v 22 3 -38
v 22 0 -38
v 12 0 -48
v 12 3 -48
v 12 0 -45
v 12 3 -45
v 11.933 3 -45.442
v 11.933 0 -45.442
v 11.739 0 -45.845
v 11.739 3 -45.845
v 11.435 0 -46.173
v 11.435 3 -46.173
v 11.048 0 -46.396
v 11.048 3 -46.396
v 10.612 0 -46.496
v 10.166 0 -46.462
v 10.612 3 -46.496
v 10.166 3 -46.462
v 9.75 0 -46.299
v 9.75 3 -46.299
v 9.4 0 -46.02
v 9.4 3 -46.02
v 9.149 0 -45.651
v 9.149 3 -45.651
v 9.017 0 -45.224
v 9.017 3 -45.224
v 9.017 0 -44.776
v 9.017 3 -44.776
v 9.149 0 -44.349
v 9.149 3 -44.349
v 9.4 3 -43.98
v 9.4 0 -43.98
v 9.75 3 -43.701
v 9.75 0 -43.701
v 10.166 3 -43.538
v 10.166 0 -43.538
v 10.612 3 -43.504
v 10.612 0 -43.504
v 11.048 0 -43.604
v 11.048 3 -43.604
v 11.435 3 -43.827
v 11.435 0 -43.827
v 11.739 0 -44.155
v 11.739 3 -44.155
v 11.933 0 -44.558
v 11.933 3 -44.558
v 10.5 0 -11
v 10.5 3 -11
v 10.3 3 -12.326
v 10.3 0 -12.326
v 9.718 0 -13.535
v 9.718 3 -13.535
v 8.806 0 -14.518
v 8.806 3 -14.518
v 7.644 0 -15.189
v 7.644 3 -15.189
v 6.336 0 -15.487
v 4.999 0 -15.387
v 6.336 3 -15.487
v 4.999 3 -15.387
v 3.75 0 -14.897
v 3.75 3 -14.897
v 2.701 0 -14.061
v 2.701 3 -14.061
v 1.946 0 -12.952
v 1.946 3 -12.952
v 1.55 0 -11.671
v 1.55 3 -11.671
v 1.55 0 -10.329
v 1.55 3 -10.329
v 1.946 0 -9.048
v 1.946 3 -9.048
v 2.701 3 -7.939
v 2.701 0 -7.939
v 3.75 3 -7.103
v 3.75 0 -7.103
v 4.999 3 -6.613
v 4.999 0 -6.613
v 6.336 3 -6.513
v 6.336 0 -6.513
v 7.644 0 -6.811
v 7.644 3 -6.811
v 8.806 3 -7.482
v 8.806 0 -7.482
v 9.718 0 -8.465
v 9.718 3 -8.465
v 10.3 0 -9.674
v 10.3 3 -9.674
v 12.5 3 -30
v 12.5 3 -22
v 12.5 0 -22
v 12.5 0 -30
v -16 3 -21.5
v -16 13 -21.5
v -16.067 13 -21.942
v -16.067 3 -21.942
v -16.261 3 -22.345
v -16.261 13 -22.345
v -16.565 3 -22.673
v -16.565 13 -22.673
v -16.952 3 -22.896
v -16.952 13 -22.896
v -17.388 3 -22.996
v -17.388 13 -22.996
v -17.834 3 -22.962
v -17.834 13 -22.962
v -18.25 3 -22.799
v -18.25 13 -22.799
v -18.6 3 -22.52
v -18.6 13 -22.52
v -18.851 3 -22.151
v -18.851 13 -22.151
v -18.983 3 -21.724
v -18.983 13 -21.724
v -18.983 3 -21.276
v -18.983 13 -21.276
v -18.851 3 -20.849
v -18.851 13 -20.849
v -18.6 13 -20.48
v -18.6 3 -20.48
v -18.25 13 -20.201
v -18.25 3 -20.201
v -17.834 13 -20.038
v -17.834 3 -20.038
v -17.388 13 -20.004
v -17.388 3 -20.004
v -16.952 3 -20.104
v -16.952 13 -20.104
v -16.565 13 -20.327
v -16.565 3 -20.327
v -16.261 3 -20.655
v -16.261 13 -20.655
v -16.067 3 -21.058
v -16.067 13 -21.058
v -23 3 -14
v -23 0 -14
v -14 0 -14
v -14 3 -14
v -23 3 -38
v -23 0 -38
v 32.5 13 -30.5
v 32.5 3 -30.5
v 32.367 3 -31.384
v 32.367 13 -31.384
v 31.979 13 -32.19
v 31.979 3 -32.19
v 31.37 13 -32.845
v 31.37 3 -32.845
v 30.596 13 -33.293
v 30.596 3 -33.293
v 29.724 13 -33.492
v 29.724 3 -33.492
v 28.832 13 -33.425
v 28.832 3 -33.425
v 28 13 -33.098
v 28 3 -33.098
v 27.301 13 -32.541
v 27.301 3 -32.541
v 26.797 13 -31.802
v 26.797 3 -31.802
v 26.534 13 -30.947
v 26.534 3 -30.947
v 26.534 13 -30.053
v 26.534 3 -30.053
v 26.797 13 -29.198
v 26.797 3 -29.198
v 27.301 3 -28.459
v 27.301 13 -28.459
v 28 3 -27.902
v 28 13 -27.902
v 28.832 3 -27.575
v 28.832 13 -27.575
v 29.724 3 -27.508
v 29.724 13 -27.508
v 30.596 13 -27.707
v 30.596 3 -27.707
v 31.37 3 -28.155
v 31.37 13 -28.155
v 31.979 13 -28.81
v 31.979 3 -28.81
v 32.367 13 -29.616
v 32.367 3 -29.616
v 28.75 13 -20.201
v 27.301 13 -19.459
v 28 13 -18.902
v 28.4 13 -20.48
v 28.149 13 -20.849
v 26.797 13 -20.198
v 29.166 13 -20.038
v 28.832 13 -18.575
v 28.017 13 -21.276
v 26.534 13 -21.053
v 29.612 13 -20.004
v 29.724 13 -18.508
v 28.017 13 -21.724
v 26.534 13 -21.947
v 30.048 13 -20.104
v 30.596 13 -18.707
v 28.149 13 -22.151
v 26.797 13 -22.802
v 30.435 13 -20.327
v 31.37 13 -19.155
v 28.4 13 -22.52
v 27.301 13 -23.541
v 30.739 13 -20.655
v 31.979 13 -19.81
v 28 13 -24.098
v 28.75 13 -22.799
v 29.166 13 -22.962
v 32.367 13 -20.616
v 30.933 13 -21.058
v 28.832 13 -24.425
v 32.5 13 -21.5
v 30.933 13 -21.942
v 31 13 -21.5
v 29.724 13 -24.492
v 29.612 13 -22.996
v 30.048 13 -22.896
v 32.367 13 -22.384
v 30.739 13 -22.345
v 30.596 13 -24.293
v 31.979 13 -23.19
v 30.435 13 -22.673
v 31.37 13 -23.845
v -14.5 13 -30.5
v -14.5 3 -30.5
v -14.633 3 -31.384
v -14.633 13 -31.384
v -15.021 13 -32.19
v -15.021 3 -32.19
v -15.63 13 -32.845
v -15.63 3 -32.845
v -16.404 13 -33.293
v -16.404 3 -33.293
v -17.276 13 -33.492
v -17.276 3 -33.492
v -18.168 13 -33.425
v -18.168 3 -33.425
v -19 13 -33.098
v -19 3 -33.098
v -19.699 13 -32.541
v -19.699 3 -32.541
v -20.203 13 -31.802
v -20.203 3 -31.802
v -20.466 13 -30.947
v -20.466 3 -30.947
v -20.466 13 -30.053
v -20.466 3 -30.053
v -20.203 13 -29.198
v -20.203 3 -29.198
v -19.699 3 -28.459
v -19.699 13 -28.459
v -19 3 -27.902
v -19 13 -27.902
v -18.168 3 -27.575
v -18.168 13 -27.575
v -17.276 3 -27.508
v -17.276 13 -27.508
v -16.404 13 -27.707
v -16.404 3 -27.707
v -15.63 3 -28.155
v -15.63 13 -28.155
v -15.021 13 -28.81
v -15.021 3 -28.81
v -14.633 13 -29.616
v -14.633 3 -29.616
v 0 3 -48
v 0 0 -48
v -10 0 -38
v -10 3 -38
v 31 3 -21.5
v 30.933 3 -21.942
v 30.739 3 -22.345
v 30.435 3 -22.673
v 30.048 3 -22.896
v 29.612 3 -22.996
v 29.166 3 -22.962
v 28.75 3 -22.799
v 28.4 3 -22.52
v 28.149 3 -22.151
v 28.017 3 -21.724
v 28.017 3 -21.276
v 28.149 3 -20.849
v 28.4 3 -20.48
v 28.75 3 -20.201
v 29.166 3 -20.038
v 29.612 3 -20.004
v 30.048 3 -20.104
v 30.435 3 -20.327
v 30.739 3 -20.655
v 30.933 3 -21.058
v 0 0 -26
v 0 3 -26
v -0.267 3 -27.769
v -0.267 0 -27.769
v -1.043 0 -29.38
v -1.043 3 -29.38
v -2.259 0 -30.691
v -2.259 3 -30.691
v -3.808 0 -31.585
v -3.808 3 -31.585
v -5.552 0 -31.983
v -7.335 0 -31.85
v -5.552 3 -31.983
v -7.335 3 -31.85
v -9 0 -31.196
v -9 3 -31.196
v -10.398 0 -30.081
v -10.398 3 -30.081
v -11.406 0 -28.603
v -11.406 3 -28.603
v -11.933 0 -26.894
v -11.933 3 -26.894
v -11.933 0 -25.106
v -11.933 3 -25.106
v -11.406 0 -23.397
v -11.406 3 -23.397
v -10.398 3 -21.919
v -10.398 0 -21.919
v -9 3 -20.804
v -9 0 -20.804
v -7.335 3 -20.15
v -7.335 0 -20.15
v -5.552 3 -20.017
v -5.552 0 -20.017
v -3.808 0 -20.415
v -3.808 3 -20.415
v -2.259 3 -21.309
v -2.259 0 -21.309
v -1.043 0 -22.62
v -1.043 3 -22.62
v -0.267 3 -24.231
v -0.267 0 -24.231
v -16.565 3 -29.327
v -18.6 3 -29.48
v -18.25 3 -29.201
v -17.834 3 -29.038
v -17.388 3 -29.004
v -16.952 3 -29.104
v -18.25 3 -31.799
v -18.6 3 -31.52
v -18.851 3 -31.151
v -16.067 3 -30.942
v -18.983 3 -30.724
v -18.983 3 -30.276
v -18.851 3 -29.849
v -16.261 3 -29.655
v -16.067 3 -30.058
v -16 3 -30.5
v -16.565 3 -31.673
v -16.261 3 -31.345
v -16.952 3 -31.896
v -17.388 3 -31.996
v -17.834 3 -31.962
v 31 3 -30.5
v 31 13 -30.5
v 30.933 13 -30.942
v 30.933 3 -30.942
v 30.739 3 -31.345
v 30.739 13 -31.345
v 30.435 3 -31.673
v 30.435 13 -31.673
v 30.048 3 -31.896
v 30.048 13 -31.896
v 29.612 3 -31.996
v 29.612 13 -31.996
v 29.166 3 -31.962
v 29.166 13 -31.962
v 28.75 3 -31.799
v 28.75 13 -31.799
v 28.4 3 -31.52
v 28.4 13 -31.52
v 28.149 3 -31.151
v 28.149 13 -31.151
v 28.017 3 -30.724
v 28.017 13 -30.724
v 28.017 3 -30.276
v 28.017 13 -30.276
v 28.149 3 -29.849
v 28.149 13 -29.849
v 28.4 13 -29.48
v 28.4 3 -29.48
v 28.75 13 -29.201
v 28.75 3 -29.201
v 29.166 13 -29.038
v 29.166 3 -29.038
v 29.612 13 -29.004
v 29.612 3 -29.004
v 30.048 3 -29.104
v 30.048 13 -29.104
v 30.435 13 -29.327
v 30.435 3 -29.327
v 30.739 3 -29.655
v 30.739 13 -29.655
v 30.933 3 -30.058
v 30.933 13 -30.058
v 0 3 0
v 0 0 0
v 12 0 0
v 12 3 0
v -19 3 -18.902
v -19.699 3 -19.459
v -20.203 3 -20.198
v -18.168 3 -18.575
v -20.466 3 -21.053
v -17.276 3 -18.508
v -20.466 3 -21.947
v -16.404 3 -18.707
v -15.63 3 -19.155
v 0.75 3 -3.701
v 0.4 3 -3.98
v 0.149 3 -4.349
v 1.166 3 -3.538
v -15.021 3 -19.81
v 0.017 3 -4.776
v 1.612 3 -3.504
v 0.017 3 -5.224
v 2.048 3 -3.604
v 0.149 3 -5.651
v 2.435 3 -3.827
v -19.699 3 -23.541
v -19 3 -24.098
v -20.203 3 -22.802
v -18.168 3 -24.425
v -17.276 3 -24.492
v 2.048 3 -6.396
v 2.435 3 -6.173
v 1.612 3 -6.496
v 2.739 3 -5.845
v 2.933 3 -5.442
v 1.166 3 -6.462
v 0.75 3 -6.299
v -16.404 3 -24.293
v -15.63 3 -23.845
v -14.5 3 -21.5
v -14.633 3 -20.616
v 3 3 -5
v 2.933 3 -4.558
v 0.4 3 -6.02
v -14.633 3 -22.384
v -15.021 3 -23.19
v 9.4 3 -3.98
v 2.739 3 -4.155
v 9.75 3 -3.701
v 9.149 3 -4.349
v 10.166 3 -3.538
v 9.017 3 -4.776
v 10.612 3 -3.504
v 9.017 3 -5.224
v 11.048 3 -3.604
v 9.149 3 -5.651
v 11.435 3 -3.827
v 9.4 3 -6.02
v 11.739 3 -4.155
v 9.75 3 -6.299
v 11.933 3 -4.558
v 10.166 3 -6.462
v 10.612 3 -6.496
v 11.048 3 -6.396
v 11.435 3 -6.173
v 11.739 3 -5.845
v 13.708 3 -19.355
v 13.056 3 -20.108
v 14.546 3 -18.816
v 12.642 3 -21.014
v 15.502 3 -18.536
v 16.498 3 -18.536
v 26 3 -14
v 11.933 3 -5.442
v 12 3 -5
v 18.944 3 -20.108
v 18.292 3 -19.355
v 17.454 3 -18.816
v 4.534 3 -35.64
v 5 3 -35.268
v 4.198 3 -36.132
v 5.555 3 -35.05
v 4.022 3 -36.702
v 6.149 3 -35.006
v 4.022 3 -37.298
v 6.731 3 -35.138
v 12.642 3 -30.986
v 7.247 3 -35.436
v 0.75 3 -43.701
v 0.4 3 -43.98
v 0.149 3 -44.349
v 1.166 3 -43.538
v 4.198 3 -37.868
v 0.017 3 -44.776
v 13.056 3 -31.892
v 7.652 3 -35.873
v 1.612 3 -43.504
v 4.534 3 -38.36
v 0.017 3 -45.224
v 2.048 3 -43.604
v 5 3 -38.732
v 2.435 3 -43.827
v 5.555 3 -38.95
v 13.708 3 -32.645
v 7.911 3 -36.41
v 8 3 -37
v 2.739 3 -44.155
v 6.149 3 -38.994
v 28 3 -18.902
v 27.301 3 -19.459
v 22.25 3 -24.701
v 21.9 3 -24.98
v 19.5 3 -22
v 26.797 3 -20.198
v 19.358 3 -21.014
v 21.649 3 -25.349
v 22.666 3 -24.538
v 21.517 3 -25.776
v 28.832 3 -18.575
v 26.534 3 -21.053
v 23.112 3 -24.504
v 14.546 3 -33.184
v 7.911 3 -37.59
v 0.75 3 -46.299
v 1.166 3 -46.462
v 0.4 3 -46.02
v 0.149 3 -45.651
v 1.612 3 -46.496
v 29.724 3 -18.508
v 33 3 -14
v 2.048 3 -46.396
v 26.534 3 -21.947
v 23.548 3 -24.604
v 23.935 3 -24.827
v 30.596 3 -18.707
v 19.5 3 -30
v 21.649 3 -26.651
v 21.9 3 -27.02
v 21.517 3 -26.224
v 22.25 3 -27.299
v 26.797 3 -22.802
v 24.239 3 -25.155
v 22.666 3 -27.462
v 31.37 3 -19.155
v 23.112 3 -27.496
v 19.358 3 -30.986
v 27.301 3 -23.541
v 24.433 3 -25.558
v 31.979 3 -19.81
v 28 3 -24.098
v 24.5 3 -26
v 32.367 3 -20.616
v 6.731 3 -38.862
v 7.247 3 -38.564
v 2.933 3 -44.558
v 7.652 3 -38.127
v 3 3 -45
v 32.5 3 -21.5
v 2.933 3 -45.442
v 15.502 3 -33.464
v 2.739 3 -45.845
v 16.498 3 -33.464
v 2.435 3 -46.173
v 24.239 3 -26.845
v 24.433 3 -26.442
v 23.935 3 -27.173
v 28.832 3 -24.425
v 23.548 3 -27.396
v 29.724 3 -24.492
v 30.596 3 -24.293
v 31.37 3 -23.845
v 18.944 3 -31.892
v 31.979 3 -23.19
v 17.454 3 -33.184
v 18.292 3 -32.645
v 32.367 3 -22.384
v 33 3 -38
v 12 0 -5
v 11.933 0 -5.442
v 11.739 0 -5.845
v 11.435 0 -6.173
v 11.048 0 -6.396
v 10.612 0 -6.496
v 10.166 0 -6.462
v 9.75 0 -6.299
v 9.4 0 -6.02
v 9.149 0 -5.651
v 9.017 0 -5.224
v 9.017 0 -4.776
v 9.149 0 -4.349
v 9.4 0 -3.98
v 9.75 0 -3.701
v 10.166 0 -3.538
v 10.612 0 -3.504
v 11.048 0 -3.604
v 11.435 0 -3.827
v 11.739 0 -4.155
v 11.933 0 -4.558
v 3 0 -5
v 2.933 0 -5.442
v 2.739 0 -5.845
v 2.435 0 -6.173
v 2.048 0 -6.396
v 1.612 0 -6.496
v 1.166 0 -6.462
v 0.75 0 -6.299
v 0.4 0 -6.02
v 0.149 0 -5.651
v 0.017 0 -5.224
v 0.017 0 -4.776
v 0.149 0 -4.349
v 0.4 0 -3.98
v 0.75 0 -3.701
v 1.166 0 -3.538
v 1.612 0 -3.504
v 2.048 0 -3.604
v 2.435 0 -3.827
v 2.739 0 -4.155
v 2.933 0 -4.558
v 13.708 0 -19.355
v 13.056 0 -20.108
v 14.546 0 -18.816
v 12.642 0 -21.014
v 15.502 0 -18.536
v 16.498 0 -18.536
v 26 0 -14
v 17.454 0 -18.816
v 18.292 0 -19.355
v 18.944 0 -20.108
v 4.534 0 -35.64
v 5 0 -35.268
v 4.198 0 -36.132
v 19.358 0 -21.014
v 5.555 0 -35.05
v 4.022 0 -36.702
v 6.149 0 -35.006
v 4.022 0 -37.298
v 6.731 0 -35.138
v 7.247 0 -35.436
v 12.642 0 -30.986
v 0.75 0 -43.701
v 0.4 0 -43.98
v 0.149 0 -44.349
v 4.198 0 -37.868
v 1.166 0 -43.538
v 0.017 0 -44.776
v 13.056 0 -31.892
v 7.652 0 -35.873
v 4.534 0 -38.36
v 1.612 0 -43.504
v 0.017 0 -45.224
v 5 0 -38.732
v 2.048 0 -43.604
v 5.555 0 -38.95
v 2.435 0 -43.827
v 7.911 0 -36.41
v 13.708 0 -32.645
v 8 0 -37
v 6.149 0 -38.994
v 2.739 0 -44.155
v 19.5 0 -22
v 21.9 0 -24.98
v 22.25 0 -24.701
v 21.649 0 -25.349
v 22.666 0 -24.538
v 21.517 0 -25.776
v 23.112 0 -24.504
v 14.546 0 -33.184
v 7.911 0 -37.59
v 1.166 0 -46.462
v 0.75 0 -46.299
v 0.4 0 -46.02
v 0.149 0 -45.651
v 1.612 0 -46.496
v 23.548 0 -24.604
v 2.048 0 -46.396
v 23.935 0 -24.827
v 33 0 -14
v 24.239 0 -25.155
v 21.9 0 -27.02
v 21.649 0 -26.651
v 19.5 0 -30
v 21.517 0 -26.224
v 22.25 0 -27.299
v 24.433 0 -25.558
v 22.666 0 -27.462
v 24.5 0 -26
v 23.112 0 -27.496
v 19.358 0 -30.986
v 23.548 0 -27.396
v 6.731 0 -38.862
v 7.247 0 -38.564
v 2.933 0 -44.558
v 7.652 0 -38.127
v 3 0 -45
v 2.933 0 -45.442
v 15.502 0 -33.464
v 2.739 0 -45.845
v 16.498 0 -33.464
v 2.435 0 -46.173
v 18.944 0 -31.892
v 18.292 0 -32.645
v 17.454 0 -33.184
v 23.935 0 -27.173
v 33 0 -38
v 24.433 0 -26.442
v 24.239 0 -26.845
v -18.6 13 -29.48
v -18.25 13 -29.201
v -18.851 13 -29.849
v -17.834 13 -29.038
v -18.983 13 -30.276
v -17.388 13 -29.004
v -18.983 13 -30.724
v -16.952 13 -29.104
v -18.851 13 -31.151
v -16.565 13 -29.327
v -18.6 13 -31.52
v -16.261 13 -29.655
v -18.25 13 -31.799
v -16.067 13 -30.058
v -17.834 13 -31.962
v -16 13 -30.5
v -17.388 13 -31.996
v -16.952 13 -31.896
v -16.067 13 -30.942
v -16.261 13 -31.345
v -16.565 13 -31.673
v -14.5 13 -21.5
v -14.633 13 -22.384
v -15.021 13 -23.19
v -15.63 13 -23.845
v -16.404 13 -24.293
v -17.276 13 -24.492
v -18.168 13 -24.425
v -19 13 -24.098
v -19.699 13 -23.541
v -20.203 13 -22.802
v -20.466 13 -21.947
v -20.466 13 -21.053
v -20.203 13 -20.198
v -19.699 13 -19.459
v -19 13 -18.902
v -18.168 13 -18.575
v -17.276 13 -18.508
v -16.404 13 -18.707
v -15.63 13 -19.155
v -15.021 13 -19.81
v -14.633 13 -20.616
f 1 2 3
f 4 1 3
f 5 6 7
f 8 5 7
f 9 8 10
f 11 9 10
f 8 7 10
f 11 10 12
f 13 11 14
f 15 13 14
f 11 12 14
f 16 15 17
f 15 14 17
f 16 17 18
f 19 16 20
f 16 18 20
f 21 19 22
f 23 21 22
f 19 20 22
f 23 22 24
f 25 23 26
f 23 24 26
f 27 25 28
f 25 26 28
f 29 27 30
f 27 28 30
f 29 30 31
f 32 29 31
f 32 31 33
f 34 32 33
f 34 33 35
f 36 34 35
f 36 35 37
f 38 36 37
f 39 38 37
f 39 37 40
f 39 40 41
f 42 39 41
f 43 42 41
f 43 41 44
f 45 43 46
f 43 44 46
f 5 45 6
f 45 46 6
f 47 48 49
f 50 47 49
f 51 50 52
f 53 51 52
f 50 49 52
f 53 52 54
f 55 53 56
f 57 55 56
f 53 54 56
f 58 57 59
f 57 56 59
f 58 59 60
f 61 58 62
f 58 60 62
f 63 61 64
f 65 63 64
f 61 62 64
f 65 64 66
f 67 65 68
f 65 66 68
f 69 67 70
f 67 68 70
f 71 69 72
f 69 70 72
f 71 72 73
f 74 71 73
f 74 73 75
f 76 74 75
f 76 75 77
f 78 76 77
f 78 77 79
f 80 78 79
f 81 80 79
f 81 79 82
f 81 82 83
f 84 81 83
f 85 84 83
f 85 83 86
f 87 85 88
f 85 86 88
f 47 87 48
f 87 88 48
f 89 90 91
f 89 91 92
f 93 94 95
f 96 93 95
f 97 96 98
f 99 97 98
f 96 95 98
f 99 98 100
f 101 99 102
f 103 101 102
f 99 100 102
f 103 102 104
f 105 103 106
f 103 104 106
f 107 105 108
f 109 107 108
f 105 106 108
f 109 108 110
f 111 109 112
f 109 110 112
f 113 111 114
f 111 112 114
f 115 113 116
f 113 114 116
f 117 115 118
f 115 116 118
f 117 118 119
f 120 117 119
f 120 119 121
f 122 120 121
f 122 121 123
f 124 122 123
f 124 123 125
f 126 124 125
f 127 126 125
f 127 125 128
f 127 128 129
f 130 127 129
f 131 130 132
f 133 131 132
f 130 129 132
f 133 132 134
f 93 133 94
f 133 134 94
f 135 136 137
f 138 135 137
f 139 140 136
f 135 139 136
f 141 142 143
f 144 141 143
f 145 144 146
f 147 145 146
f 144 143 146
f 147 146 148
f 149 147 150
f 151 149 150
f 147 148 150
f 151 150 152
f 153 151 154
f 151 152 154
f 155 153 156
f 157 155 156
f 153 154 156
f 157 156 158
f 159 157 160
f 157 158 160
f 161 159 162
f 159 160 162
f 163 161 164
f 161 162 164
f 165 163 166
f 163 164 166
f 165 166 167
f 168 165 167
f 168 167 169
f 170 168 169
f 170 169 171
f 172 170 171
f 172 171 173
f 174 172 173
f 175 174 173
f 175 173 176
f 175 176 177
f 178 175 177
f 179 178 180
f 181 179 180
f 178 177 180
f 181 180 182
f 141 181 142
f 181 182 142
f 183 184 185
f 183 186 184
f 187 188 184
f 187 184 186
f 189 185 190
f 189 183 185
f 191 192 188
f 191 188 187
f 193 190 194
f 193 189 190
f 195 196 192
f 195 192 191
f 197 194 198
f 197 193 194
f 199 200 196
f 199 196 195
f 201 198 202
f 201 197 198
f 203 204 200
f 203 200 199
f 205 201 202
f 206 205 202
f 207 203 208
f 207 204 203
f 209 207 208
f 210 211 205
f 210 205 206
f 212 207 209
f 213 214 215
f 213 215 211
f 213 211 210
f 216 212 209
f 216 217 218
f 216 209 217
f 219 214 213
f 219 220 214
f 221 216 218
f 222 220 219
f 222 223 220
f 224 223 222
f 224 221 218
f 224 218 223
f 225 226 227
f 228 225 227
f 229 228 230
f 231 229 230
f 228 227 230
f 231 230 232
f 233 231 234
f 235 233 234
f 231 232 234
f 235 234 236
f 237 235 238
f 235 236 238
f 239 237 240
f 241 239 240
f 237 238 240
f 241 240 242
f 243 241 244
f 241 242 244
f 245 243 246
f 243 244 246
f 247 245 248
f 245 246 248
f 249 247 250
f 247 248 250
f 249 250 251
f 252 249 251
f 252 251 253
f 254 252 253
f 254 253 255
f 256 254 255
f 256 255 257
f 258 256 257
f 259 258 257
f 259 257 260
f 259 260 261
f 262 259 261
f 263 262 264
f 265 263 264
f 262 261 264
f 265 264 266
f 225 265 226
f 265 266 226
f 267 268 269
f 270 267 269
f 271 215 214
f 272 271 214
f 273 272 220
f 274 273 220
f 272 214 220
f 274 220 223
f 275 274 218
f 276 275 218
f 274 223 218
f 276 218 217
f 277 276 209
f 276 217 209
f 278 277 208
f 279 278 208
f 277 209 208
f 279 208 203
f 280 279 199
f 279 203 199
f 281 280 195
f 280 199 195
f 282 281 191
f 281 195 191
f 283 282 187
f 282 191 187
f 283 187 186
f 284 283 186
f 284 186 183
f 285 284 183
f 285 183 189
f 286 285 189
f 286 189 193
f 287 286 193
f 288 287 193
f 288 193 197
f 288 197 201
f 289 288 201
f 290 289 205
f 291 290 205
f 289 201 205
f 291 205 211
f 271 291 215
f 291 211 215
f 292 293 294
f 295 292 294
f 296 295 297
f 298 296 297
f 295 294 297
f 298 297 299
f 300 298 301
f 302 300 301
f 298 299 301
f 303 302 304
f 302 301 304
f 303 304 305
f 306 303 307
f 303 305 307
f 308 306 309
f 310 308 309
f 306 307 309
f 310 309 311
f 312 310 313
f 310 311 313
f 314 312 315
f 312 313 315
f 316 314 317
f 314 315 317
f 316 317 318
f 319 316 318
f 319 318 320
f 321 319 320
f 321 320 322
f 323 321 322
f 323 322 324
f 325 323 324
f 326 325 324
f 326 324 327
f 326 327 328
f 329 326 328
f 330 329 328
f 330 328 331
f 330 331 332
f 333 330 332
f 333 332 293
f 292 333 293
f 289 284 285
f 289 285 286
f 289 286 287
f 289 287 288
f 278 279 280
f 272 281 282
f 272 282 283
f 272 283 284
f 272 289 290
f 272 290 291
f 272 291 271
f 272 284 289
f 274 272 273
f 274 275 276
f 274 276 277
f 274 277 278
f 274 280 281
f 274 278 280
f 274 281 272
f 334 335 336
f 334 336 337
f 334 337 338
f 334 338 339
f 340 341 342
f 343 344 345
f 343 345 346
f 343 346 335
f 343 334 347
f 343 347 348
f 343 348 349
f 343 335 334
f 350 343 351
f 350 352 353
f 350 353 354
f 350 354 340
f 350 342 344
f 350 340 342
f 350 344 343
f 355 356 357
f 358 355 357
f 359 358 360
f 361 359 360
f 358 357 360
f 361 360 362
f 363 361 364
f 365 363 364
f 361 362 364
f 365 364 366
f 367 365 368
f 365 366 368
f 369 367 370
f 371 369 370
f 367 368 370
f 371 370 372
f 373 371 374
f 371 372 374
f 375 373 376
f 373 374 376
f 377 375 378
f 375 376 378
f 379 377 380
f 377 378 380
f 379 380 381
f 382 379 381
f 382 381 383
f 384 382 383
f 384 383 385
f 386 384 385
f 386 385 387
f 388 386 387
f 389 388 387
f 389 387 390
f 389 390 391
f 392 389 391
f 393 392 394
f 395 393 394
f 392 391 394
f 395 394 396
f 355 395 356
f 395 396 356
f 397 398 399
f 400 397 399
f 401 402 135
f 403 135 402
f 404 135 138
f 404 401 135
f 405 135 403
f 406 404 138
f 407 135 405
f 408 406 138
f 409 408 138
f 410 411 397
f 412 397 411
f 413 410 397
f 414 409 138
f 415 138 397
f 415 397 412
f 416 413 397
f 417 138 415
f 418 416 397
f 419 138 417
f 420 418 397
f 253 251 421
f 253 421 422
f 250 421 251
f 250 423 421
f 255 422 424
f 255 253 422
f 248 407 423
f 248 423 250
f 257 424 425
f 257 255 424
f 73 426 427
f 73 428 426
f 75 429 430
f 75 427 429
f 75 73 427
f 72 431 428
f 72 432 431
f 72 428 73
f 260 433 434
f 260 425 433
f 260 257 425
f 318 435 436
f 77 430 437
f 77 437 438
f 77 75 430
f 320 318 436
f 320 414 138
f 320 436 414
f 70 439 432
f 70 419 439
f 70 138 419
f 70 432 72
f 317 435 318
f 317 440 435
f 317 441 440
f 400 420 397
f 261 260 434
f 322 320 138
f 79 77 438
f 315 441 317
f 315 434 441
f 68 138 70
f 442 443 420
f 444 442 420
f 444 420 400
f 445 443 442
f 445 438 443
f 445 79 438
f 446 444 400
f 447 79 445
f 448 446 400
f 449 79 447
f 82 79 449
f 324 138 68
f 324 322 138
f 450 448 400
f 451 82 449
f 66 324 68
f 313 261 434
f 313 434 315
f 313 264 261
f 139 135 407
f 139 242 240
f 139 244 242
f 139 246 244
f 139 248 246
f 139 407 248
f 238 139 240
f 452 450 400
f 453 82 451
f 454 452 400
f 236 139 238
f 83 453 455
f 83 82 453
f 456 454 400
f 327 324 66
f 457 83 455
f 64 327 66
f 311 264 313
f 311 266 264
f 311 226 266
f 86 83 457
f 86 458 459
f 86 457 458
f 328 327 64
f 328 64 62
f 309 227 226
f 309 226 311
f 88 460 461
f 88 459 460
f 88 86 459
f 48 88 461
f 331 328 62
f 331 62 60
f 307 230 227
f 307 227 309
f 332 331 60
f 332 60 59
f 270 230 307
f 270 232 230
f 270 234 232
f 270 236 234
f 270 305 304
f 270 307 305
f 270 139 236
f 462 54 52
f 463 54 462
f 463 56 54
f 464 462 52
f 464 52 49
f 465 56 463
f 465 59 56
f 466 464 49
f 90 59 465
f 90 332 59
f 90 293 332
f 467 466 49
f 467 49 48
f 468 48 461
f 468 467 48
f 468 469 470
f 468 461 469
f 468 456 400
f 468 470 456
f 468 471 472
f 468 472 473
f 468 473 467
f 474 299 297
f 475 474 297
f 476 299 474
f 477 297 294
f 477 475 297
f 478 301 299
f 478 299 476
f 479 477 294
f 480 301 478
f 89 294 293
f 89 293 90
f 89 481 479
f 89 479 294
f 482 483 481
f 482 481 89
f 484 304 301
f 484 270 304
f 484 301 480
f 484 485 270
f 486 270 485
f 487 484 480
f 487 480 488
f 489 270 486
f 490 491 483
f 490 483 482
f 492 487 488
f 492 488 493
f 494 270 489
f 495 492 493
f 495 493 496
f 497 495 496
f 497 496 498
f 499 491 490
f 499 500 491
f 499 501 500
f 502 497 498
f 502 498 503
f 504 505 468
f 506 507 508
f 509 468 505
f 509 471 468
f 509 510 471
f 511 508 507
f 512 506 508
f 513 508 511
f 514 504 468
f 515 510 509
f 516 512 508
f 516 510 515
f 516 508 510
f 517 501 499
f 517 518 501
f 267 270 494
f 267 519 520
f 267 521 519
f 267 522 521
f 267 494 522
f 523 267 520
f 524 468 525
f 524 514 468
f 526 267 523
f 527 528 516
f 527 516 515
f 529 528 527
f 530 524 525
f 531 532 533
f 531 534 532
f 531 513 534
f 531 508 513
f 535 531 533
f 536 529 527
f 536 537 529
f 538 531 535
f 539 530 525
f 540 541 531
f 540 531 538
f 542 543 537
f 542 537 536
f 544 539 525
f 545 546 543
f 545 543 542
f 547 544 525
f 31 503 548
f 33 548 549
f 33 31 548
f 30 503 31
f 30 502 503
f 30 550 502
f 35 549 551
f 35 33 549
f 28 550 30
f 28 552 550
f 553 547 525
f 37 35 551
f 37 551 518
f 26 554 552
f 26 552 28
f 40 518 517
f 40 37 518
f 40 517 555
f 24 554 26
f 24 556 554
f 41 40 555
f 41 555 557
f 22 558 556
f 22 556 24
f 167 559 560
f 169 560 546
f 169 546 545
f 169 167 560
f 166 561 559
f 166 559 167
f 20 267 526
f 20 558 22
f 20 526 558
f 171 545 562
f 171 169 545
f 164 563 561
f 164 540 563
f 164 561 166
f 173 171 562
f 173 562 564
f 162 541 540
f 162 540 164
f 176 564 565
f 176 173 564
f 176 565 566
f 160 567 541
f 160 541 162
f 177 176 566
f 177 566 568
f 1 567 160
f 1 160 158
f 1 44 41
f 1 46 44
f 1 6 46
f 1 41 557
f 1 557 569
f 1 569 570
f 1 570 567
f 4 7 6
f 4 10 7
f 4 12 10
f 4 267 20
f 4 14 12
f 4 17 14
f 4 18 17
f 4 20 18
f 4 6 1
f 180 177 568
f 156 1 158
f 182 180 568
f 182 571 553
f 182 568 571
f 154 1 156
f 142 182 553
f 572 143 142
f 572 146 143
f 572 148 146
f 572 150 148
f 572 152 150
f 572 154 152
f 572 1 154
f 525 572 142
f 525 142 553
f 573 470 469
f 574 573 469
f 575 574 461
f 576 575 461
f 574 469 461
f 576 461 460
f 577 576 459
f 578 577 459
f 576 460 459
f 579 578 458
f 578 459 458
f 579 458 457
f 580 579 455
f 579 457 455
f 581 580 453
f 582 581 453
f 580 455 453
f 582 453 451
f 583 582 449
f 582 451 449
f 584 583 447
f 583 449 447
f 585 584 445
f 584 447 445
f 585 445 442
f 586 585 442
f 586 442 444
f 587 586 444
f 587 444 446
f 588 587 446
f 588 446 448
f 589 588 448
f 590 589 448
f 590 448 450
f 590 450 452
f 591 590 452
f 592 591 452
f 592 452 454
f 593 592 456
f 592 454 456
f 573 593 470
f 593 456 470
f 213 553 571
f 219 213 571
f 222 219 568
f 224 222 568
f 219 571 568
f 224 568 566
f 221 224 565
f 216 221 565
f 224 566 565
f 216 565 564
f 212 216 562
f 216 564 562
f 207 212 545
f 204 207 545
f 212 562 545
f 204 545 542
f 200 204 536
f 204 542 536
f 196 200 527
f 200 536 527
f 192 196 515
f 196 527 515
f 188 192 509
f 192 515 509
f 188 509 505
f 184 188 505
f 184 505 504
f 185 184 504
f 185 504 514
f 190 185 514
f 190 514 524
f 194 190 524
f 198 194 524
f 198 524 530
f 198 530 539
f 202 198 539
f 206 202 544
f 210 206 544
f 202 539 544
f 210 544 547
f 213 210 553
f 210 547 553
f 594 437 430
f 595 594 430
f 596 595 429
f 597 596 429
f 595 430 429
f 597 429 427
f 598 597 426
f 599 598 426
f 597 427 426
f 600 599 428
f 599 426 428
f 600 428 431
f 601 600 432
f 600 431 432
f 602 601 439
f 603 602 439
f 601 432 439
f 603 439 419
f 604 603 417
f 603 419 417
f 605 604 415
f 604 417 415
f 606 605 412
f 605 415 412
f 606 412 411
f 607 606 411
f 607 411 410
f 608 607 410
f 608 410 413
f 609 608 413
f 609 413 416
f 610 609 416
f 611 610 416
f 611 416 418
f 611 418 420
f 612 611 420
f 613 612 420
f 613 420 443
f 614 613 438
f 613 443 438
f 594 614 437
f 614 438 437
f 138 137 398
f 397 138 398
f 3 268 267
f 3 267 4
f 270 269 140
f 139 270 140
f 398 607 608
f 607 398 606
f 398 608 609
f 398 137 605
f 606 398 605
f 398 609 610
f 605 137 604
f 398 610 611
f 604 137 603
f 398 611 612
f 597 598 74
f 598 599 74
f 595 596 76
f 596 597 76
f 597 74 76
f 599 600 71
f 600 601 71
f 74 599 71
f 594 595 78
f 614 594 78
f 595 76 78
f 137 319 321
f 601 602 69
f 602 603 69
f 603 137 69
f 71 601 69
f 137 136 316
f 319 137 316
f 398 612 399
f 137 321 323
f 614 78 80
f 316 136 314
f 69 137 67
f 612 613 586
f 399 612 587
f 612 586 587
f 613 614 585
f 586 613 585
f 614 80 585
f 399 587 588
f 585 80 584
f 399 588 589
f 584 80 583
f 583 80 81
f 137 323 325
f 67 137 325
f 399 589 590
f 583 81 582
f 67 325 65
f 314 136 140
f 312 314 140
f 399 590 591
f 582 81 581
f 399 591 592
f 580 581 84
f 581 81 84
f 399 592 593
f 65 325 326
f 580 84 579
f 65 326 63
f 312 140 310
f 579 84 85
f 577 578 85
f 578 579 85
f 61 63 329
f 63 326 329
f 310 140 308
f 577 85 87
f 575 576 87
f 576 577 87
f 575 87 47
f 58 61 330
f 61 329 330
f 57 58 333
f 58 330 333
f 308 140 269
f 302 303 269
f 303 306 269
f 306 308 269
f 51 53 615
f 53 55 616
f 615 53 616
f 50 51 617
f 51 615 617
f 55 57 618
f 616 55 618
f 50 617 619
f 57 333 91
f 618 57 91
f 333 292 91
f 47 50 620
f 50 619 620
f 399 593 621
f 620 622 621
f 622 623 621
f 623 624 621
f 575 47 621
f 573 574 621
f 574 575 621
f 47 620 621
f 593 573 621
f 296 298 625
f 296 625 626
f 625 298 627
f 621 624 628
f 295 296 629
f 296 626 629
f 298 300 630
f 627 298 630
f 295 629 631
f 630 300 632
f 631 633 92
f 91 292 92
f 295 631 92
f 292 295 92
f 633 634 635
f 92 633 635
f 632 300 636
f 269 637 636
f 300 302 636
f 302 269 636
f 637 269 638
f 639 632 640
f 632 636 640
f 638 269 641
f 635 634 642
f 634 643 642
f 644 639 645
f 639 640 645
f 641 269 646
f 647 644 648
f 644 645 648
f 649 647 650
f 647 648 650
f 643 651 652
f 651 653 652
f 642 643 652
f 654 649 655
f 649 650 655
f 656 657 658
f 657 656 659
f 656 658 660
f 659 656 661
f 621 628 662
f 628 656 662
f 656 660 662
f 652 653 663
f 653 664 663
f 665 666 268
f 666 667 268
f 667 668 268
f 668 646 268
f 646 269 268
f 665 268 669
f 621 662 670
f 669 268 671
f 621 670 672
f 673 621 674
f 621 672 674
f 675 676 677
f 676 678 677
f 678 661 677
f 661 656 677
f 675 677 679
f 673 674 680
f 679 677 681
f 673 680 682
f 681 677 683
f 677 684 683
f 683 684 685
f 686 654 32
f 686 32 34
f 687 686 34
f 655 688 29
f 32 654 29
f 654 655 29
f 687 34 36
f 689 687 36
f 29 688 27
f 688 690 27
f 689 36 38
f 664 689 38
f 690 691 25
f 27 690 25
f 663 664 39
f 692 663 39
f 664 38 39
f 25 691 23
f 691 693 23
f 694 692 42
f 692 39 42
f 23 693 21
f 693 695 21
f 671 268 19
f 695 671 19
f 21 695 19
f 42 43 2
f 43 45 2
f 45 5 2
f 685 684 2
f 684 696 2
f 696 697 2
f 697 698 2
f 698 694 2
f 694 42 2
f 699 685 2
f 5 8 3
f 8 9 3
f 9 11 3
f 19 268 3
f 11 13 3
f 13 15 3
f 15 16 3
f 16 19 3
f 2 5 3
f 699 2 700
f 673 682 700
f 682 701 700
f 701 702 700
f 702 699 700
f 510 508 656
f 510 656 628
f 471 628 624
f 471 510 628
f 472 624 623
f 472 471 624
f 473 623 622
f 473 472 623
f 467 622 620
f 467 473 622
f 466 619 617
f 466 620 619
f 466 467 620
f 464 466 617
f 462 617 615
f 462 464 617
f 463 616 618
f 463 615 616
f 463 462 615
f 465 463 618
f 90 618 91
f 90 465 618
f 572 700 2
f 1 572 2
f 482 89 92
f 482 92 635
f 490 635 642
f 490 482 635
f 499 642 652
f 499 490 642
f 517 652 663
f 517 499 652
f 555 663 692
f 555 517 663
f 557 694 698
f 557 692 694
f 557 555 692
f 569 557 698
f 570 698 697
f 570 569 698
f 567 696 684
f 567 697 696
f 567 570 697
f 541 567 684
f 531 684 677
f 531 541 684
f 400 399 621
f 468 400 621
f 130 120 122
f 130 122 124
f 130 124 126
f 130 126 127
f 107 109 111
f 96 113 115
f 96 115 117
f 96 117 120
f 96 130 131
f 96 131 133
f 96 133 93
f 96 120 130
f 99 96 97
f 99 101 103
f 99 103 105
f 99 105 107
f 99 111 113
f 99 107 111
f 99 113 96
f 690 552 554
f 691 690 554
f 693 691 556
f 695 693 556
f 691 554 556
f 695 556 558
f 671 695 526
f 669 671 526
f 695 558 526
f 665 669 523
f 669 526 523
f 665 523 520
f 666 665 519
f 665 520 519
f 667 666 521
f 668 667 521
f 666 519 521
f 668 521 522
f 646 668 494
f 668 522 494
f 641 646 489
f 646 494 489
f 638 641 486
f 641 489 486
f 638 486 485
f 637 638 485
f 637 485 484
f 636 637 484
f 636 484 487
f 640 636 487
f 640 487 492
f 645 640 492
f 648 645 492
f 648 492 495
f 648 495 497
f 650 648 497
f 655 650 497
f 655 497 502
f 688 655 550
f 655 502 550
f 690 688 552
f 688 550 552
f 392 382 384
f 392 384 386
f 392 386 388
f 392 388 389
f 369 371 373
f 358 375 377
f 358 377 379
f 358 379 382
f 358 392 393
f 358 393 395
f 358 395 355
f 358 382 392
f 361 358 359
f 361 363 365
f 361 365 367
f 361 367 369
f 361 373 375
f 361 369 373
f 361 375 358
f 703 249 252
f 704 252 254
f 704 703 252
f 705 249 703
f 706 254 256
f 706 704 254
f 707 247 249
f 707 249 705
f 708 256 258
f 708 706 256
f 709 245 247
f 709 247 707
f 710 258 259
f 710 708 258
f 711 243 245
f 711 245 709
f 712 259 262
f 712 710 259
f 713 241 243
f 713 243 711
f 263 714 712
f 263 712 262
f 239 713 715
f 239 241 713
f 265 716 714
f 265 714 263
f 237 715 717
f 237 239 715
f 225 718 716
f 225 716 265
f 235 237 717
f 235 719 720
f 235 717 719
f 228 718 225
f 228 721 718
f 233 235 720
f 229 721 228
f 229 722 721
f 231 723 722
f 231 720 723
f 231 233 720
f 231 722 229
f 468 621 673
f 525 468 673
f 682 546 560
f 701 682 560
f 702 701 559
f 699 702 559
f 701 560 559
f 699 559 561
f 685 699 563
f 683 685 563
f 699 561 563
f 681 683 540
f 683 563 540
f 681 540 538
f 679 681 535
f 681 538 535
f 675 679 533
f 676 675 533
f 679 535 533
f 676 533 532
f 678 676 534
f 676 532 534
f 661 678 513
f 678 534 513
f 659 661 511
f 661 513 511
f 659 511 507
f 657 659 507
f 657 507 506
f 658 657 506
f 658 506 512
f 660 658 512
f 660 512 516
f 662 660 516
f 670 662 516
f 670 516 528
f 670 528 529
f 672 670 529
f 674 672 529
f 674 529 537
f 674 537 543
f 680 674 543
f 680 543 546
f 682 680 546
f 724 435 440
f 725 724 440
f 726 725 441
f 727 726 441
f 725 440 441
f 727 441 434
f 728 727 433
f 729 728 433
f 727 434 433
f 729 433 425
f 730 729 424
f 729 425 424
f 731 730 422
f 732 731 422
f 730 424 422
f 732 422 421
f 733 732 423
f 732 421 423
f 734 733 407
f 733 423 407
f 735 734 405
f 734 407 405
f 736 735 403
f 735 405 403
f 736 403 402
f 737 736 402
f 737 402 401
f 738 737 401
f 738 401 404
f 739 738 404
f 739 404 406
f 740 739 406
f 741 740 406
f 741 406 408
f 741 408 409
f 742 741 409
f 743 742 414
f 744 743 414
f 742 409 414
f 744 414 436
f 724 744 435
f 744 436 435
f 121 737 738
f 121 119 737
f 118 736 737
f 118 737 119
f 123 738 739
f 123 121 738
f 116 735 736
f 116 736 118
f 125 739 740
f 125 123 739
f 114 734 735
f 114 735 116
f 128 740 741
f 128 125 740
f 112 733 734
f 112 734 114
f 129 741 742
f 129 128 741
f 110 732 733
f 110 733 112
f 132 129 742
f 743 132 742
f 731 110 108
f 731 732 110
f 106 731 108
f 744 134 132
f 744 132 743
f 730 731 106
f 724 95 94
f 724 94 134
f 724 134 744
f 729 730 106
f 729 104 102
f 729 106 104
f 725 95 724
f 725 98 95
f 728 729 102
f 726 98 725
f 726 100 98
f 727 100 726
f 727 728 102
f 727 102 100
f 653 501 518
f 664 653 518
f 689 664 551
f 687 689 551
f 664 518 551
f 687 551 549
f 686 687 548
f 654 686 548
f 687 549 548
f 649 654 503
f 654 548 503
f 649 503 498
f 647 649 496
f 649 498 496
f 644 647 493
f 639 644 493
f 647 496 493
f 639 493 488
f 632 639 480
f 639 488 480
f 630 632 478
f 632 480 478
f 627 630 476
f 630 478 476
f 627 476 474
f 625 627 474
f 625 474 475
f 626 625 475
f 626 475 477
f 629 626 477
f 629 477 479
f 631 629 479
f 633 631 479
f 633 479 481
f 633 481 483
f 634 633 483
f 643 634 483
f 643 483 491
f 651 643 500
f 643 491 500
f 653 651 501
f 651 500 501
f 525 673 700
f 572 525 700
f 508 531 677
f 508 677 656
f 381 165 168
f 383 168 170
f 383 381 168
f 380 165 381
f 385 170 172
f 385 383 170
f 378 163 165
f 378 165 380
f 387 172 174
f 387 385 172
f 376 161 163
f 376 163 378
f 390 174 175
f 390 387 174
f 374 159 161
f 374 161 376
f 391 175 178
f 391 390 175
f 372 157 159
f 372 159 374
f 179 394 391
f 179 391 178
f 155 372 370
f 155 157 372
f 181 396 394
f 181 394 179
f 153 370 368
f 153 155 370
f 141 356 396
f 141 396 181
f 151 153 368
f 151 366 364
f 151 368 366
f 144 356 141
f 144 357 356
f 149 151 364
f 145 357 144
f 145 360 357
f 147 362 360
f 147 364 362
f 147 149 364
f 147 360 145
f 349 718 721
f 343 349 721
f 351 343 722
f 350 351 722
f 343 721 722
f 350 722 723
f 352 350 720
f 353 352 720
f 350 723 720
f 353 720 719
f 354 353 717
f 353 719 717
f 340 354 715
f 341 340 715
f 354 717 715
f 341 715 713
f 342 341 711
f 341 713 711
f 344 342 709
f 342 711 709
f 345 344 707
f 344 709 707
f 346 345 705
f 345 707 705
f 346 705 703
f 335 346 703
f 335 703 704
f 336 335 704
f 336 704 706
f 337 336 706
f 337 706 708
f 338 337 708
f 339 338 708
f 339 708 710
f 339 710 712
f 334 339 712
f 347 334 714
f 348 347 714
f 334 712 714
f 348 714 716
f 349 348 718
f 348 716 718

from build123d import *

# Parameters (mm, degrees)
SKETCH1_W           = 12
SKETCH1_H           = 10
SKETCH1_H_2         = 24
SKETCH1_H_3         = 14
BOSS_EXTRUDE1_DEPTH = 3
SKETCH2_R           = 1.5
SKETCH2_R_2         = 2
SKETCH2_R_3         = 4.5
CUT_EXTRUDE1_DEPTH  = 3
SKETCH3_R           = 3
BOSS_EXTRUDE2_DEPTH = 10
SKETCH4_R           = 1.5
SKETCH4_R_2         = 6
CUT_EXTRUDE2_DEPTH  = 4
SKETCH5_R           = 1.5
CUT_EXTRUDE3_DEPTH  = 10


with BuildPart() as part:
    # Sketch1 → Boss-Extrude1 (new body)
    with BuildSketch(Plane(origin=(0, 0, 0), x_dir=(1, 0, 0), z_dir=(0, 1, 0))):
        Polygon((0, 0), (0, 14), (-14, 14), align=None)
        Polygon((0, 38), (-10, 38), (-23, 38), (-23, 14), (-14, 14), (0, 14), align=None)
        Polygon((22, 38), (12, 48), (12, 38), align=None)
        with Locations((6, 43)):
            Rectangle(SKETCH1_W, SKETCH1_H)
        with Locations((6, 26)):
            Rectangle(SKETCH1_W, SKETCH1_H_2)
        Polygon((22, 38), (12, 38), (12, 14), (26, 14), (33, 14), (33, 38), align=None)
        Polygon((26, 14), (12, 14), (12, 0), align=None)
        with Locations((6, 7)):
            Rectangle(SKETCH1_W, SKETCH1_H_3)
        Polygon((0, 38), (0, 48), (-10, 38), align=None)
    extrude(amount=BOSS_EXTRUDE1_DEPTH)

    # Sketch2 → Cut-Extrude1 (cut)
    with BuildSketch(Plane(origin=(0, 3, 0), x_dir=(1, 0, 0), z_dir=(0, 1, 0))):
        with Locations((1.5, 45)):
            Circle(SKETCH2_R)
        with Locations((10.5, 45)):
            Circle(SKETCH2_R)
        with Locations((10.5, 5)):
            Circle(SKETCH2_R)
        with Locations((1.5, 5)):
            Circle(SKETCH2_R)
        with Locations((6, 37)):
            Circle(SKETCH2_R_2)
        with Locations((6, 11)):
            Circle(SKETCH2_R_3)
    extrude(amount=-CUT_EXTRUDE1_DEPTH, mode=Mode.SUBTRACT)

    # Sketch3 → Boss-Extrude2 (add)
    with BuildSketch(Plane(origin=(0, 3, 0), x_dir=(1, 0, 0), z_dir=(0, 1, 0))):
        with Locations((-17.5, 30.5)):
            Circle(SKETCH3_R)
        with Locations((-17.5, 21.5)):
            Circle(SKETCH3_R)
        with Locations((29.5, 30.5)):
            Circle(SKETCH3_R)
        with Locations((29.5, 21.5)):
            Circle(SKETCH3_R)
    extrude(amount=BOSS_EXTRUDE2_DEPTH)

    # Sketch4 → Cut-Extrude2 (cut, through all)
    with BuildSketch(Plane(origin=(0, 3, 0), x_dir=(1, 0, 0), z_dir=(0, 1, 0))):
        with Locations((23, 26)):
            Circle(SKETCH4_R)
        with Locations((-6, 26)):
            Circle(SKETCH4_R_2)
        with BuildLine():
            Line((12.5, 22), (12.5, 30))
            ThreePointArc((12.5, 30), (16, 33.5), (19.5, 30))
            Line((19.5, 30), (19.5, 22))
            ThreePointArc((19.5, 22), (16, 18.5), (12.5, 22))
        make_face()
    extrude(amount=-CUT_EXTRUDE2_DEPTH, mode=Mode.SUBTRACT)

    # Sketch5 → Cut-Extrude3 (cut)
    with BuildSketch(Plane(origin=(0, 13, 0), x_dir=(1, 0, 0), z_dir=(0, 1, 0))):
        with Locations((29.5, 30.5)):
            Circle(SKETCH5_R)
        with Locations((29.5, 21.5)):
            Circle(SKETCH5_R)
        with Locations((-17.5, 30.5)):
            Circle(SKETCH5_R)
        with Locations((-17.5, 21.5)):
            Circle(SKETCH5_R)
    extrude(amount=-CUT_EXTRUDE3_DEPTH, mode=Mode.SUBTRACT)


solid = part.part
